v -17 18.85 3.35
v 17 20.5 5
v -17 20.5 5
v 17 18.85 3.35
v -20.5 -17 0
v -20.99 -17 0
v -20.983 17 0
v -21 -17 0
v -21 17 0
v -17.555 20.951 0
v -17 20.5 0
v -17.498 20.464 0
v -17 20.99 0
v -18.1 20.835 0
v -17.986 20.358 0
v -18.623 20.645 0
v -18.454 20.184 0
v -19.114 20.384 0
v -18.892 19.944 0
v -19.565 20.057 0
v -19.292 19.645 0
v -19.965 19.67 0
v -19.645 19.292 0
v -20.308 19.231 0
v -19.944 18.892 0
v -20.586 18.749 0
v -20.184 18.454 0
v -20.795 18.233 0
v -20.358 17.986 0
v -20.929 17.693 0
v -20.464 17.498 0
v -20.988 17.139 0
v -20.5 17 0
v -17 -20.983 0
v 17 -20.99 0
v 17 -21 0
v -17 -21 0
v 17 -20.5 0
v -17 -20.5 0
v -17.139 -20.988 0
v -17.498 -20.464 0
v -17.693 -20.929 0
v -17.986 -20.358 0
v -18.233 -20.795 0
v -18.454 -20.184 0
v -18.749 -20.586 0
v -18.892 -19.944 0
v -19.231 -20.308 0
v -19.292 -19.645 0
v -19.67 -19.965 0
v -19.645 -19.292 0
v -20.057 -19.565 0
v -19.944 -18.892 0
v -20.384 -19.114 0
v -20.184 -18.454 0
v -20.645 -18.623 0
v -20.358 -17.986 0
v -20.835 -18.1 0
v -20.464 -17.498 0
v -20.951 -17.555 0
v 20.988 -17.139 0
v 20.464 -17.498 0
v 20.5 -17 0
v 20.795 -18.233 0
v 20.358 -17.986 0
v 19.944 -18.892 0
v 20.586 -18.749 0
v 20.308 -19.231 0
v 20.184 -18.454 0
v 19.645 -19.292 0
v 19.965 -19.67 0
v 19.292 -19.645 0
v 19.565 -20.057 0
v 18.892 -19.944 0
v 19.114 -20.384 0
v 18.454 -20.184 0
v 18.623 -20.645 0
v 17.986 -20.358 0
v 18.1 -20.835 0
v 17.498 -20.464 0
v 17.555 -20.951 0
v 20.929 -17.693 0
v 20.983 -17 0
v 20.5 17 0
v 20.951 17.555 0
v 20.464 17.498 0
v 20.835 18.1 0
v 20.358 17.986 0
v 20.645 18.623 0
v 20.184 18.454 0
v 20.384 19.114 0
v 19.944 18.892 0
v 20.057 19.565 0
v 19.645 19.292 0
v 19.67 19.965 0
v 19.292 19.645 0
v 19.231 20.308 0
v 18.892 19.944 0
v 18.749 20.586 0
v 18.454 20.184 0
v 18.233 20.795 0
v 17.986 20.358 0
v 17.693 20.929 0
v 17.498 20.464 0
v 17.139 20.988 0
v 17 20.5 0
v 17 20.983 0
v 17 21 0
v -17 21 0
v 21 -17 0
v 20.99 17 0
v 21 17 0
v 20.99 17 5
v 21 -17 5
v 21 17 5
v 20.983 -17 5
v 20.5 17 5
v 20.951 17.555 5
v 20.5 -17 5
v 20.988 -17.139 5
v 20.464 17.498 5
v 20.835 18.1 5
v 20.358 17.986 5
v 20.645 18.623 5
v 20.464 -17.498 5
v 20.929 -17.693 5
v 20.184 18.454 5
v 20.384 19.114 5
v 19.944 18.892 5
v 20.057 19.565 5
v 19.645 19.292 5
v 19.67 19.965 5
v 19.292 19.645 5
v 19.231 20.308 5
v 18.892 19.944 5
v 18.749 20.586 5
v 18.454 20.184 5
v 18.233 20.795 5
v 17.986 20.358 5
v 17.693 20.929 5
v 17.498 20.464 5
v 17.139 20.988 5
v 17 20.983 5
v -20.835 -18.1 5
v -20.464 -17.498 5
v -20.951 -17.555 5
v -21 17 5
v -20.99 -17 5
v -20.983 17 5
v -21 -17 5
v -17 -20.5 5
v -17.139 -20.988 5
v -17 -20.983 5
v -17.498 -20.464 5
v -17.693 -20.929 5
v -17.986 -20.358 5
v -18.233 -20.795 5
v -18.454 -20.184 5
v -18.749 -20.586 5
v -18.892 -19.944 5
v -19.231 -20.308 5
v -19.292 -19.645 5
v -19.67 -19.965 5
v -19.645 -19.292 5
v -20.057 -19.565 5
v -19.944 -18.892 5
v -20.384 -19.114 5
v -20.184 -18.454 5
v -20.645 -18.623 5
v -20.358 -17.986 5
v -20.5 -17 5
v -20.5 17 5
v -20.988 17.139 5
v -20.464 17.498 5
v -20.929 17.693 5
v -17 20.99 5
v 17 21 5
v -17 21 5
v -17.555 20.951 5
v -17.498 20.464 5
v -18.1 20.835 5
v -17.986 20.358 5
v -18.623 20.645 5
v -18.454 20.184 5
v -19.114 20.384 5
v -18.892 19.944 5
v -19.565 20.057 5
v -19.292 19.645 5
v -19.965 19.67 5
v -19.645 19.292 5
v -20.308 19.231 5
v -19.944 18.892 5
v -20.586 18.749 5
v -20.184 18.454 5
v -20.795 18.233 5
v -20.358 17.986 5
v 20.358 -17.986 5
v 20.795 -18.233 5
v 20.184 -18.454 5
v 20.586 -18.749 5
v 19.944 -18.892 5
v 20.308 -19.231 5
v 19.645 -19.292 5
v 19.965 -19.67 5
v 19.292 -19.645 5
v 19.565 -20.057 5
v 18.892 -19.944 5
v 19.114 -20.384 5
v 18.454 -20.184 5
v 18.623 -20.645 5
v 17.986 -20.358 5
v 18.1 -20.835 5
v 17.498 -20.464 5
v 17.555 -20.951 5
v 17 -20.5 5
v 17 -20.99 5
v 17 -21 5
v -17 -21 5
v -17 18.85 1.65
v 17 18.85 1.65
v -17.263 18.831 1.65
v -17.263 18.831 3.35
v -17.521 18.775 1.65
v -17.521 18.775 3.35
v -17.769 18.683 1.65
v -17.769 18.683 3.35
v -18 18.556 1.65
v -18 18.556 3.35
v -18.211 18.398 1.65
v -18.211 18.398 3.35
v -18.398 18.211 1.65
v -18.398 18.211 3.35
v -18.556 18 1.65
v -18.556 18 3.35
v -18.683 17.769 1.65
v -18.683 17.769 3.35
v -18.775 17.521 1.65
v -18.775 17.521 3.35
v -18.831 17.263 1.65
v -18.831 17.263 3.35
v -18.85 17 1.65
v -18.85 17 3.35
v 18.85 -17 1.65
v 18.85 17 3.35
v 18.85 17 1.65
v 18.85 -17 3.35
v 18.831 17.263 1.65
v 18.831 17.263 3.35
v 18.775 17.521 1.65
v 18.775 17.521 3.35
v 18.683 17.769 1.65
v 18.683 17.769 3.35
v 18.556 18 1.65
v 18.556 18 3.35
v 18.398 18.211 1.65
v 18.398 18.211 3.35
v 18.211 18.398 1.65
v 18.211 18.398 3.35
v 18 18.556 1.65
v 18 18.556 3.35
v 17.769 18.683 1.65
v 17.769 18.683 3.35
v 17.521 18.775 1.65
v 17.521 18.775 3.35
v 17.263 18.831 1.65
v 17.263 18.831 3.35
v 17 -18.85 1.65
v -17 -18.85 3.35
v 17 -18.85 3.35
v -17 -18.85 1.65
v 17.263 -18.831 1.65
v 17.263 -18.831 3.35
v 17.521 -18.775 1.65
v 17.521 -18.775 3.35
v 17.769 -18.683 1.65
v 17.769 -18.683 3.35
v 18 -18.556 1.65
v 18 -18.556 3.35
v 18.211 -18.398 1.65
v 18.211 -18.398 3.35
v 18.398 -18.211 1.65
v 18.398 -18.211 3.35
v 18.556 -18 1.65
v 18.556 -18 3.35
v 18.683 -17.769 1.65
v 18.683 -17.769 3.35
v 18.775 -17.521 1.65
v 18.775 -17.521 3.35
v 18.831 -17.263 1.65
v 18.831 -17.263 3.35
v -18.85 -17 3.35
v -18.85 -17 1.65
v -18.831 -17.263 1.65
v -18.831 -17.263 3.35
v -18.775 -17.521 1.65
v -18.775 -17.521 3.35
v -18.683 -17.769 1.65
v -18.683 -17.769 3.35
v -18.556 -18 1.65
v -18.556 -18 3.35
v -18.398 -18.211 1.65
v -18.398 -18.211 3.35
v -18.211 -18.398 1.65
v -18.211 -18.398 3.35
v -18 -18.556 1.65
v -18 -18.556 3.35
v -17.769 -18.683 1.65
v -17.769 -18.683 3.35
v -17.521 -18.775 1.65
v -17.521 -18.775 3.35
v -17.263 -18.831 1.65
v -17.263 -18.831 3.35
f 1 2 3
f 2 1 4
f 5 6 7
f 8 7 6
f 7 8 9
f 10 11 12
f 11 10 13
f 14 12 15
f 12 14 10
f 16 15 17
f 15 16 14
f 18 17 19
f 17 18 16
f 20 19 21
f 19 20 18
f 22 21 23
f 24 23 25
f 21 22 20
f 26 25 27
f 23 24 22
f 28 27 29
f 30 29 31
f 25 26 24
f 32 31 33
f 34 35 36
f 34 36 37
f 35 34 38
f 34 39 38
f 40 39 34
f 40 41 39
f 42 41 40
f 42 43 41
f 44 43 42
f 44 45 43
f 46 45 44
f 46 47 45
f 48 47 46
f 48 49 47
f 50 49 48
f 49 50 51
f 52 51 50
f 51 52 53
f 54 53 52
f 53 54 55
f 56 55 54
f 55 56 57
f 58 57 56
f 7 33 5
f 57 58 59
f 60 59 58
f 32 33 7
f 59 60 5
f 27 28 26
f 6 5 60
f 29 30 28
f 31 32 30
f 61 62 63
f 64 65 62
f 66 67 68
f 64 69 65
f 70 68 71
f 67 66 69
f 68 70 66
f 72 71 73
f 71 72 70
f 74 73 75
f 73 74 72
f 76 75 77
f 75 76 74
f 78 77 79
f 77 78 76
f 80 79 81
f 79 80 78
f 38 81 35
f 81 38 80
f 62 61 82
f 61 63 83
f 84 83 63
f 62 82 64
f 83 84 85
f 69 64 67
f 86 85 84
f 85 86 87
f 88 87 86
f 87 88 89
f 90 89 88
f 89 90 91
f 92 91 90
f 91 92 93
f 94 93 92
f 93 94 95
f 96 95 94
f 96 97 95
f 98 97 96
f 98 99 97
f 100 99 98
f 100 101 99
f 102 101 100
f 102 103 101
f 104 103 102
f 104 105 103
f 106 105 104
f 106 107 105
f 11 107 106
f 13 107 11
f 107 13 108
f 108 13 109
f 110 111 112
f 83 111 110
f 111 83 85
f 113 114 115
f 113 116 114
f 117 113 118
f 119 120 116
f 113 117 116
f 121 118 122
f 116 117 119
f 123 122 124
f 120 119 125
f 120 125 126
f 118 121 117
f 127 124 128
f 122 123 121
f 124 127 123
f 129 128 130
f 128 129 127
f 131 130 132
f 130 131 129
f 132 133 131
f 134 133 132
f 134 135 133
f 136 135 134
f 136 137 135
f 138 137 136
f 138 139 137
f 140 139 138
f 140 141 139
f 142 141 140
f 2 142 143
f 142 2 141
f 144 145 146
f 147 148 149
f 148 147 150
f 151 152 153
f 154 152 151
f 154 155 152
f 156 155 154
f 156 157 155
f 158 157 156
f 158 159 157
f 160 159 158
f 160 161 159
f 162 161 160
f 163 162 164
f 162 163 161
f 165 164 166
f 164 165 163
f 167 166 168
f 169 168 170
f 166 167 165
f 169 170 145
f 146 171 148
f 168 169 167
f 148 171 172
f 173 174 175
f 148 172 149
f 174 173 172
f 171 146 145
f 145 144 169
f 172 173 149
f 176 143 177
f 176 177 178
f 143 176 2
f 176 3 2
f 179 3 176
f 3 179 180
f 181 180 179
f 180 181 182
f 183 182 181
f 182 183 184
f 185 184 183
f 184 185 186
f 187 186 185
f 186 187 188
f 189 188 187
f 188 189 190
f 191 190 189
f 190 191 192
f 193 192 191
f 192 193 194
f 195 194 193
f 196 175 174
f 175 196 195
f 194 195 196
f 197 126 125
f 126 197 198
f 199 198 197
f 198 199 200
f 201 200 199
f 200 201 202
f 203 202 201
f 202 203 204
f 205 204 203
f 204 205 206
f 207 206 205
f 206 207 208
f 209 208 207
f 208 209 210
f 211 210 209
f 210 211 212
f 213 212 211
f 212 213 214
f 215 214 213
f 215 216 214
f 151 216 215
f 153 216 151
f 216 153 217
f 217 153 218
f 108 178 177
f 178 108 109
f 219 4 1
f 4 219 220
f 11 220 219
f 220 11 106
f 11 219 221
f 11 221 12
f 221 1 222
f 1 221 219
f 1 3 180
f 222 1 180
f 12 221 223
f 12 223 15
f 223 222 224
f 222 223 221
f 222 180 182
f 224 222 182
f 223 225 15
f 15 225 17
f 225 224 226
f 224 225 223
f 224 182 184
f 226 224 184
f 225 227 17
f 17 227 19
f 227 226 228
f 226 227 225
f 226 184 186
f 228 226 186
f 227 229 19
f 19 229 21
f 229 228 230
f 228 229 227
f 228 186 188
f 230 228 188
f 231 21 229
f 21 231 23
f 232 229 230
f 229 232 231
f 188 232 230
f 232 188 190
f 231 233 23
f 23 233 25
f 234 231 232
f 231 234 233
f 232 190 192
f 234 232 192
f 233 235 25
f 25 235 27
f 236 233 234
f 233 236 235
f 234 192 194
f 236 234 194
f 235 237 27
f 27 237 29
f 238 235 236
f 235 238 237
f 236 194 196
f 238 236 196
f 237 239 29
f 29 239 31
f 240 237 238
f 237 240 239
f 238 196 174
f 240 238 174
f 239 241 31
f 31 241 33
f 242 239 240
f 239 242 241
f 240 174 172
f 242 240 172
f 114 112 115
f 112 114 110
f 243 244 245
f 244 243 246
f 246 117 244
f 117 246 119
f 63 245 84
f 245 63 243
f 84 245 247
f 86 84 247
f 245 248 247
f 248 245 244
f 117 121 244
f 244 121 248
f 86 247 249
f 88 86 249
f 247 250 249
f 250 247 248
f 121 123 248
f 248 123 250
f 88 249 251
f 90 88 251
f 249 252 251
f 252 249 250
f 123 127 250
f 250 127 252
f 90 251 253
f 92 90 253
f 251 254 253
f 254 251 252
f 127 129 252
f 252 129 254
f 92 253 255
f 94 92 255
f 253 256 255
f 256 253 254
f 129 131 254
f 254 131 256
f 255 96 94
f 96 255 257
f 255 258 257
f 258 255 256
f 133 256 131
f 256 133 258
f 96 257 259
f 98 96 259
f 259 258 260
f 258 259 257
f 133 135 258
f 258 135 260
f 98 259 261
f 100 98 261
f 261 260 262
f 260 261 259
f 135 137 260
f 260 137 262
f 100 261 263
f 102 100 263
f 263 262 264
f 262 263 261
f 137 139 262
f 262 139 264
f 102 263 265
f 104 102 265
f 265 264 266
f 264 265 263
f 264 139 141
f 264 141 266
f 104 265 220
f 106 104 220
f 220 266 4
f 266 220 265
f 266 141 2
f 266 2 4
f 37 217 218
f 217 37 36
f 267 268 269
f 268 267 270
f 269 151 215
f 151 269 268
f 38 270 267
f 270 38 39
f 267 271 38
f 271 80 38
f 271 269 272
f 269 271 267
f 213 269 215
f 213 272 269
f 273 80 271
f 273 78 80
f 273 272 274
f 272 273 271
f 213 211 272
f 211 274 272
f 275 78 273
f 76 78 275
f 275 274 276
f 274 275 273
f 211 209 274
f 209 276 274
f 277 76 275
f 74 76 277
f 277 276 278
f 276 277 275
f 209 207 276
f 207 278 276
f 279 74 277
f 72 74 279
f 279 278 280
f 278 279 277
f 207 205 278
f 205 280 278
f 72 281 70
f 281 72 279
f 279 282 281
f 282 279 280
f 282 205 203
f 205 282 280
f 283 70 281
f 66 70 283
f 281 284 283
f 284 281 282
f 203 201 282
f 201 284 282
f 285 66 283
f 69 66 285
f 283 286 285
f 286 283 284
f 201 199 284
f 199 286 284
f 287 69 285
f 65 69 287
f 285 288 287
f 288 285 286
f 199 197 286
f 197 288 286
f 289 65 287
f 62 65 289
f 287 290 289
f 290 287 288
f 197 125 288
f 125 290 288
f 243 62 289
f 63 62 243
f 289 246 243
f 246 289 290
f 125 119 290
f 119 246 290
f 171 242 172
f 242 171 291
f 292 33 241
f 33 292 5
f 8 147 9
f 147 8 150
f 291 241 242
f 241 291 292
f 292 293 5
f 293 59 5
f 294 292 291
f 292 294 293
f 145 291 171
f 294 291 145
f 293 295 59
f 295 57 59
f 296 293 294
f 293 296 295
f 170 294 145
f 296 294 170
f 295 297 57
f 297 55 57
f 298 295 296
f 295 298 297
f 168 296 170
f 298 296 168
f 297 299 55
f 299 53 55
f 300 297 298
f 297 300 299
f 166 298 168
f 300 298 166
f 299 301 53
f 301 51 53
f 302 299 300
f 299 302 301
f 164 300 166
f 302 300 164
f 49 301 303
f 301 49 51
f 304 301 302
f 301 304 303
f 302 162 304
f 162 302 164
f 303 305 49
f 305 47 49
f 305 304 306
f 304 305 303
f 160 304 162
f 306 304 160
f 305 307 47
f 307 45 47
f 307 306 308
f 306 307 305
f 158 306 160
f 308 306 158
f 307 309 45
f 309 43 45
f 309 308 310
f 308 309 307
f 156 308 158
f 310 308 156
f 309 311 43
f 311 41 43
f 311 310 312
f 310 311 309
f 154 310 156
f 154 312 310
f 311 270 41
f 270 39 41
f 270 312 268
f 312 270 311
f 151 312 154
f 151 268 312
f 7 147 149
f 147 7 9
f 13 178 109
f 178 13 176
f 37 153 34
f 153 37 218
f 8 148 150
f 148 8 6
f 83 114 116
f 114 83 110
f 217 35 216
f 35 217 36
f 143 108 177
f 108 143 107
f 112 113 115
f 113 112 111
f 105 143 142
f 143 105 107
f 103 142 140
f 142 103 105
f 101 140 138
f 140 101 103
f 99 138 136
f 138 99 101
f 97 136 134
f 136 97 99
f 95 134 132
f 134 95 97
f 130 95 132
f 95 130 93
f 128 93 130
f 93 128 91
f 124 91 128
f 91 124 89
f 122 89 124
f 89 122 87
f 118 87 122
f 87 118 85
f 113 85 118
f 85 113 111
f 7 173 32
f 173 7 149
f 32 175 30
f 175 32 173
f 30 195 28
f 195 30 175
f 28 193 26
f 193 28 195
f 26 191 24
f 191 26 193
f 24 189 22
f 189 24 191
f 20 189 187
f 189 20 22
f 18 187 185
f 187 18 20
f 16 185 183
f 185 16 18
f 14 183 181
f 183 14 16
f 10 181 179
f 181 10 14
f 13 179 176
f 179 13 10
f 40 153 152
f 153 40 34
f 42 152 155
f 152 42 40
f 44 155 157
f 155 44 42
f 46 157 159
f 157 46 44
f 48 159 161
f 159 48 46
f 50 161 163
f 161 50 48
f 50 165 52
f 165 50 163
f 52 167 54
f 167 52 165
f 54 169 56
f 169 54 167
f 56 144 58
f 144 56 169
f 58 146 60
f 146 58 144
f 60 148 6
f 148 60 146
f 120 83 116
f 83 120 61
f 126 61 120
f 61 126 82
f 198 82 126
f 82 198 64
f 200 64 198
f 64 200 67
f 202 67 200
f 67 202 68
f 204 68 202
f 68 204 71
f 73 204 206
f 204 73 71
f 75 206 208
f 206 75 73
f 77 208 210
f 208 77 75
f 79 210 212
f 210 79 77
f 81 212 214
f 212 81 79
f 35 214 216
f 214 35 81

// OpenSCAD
// ===== INFORMATION ===== //
/*
 IMPORTANT: rendering will be better for analyzing the model if fast-csg is enabled. As of writing, this feature is only available in the development builds and not the official release of OpenSCAD, but it makes rendering only take a couple seconds, even for comically large bins. Enable it in Edit > Preferences > Features > fast-csg

https://github.com/kennetek/gridfinity-rebuilt-openscad

*/

// ===== PARAMETERS ===== //

/* [Setup Parameters] */
$fa = 8;
$fs = 0.25;

/* [General Settings] */
// What to generate
what = 0; // [0: baseplate, 1: support spacer]

// number of units along x-axis
gridx = 1;
// number of units along y-axis
gridy = 1;

/* [Fit to Drawer] */
// minimum length of baseplate along x (leave zero to ignore, will automatically fill area if gridx is zero)
distancex = 0;
// minimum length of baseplate along y (leave zero to ignore, will automatically fill area if gridy is zero)
distancey = 0;

// where to align extra space along x
fitx = 0; // [-1:0.1:1]
// where to align extra space along y
fity = 0; // [-1:0.1:1]

module __Customizer_Limit__ () {}  // Hide following assignments from Customizer.

// Length of a grid unit
GRID_UNIT_SIZE = 42;

// Tolerance to make sure cuts don't leave a sliver behind,
// and that items are properly connected to each other.
TOLERANCE = 0.01;


BASEPLATE_OUTSIDE_RADIUS = 8 / 2;
// Overall height of the baseplate.
BASEPLATE_HEIGHT = 5;
// Width of the top and bottom surfaces that stack on each other.
// This is for single, e.g. outside wall. On inside walls it will be double that.
MATING_WIDTH = 0.5;
// Thickness of a single, e.g. outside wall. Inside walls will be double that.
BASEPLATE_WALL_THICKNESS = 2.15;
// Thickness of a spacer between stacked plates, usually one print layer.
SPACER_HEIGHT = 0.2;

SLOPE_SPAN = BASEPLATE_WALL_THICKNESS - MATING_WIDTH;
// Polygon describing the raw baseplate lip.
BASEPLATE_LIP = [
    [SLOPE_SPAN, 0], 
    [0, SLOPE_SPAN], 
    [0, BASEPLATE_HEIGHT - SLOPE_SPAN], 
    [SLOPE_SPAN, BASEPLATE_HEIGHT], 
    [BASEPLATE_WALL_THICKNESS, BASEPLATE_HEIGHT], 
    [BASEPLATE_WALL_THICKNESS, 0], 
    [SLOPE_SPAN, 0] 
];

SPACER_LIP = [
    [0, 0], 
    [MATING_WIDTH, 0], 
    [MATING_WIDTH, SPACER_HEIGHT], 
    [0, SPACER_HEIGHT], 
    [0, 0]
];

color("tomato")
if (what == 0) {
    generate(BASEPLATE_LIP, BASEPLATE_WALL_THICKNESS, BASEPLATE_HEIGHT, [gridx, gridy], [distancex, distancey], [fitx, fity]);
} else if (what == 1) {
    generate(SPACER_LIP, MATING_WIDTH, SPACER_HEIGHT, [gridx, gridy], [distancex, distancey], [fitx, fity]);
}

// ===== CONSTRUCTION ===== //

/**
 * @brief Create a baseplate.
 * @param lip_polygon polygon representing a lip section profile
 * @param wall_thickness - max thickness of the wall in mm
 * @param height height of the profile to generate
 * @param grid_size_units Number of Gridfinity units along both axes.
 *        2d Vector. [x, y].
 *        Set to [0, 0] to auto calculate using min_size_mm.
 * @param min_size_mm Minimum size of the baseplate. [x, y]
 *                    Extra space is filled with solid material.
 *                    Enables "Fit to Drawer."
 * @param fit_offset Determines where padding is added.
 */
module generate(lip_polygon, wall_thickness, height, grid_size_units, min_size_mm, fit_offset = [0, 0]) {

    assert(is_list(grid_size_units) && len(grid_size_units) == 2,
        "grid_size_bases must be a 2d list");
    assert(is_list(min_size_mm) && len(min_size_mm) == 2,
        "min_size_mm must be a 2d list");
    assert(is_list(fit_offset) && len(fit_offset) == 2,
        "fit_offset must be a 2d list");
    assert(grid_size_units.x > 0 || min_size_mm.x > 0,
        "Must have positive x grid amount!");
    assert(grid_size_units.y > 0 || min_size_mm.y > 0,
        "Must have positive y grid amount!");

    // Final size in number of units
    actual_grid_size_units = [for (i = [0:1])
        grid_size_units[i] == 0 ? floor(min_size_mm[i] / GRID_UNIT_SIZE) : grid_size_units[i]];

    // Final size of the base before padding. In mm.
    grid_size_mm = concat(actual_grid_size_units * GRID_UNIT_SIZE, [BASEPLATE_HEIGHT]);

    // Final size, including padding. In mm.
    final_size_mm = [
        max(grid_size_mm.x, min_size_mm.x),
        max(grid_size_mm.y, min_size_mm.y),
        height
    ];

    // Amount of padding needed to fit to a specific drawer size. In mm.
    padding_mm = final_size_mm - grid_size_mm;

    is_padding_needed = padding_mm != [0, 0, 0];

    //Convert the fit offset to percent of how much will be added to the positive axes.
    // -1 : 1 -> 0 : 1
    fit_percent_positive = [for (i = [0:1]) (fit_offset[i] + 1) / 2];

    padding_start_point = -grid_size_mm/2 -
        [
            padding_mm.x * (1 - fit_percent_positive.x),
            padding_mm.y * (1 - fit_percent_positive.y),
            -grid_size_mm.z/2
        ];

    corner_points = [
        padding_start_point + [final_size_mm.x, final_size_mm.y, 0],
        padding_start_point + [0, final_size_mm.y, 0],
        padding_start_point,
        padding_start_point + [final_size_mm.x, 0, 0],
    ];

    echo(str("Number of Grids per axes (X, Y)]: ", actual_grid_size_units));
    echo(str("Final size (in mm): ", final_size_mm));
    if (is_padding_needed) {
        echo(str("Padding +X (in mm): ", padding_mm.x * fit_percent_positive.x));
        echo(str("Padding -X (in mm): ", padding_mm.x * (1 - fit_percent_positive.x)));
        echo(str("Padding +Y (in mm): ", padding_mm.y * fit_percent_positive.y));
        echo(str("Padding -Y (in mm): ", padding_mm.y * (1 - fit_percent_positive.y)));
    }

    difference() {
        union() {
            // Baseplate itself
            pattern_linear(actual_grid_size_units.x, actual_grid_size_units.y, GRID_UNIT_SIZE) {
                // Single Baseplate piece
                difference() {
                    square_lip(lip_polygon, height, wall_thickness);
                }
            }

            // Padding
            if (is_padding_needed) {
                render()
                difference() {
                    translate(padding_start_point)
                    cube(final_size_mm);

                    translate([
                        -grid_size_mm.x/2,
                        -grid_size_mm.y/2,
                        0
                    ])
                    cube(grid_size_mm);
                }
            }
        }

        // Round the outside corners (Including Padding)
        for(i = [0:len(corner_points) - 1]) {
                point = corner_points[i];
                translate([
                point.x + (BASEPLATE_OUTSIDE_RADIUS * -sign(point.x)),
                point.y + (BASEPLATE_OUTSIDE_RADIUS * -sign(point.y)),
                0
            ])
            rotate([0, 0, i*90])
            square_corner(height, true);
        }
    }
}

/**
 * @brief Added or removed from the baseplate to square off or round the corners.
 * @param height Height of the plate being generated
 * @param subtract If the corner should be scaled to allow subtraction.
 */
module square_corner(height, subtract=false) {
    assert(is_bool(subtract));

    subtract_amount = subtract ? TOLERANCE : 0;

    translate([0, 0, -subtract_amount])
    linear_extrude(height + (2 * subtract_amount))
    difference() {
        square(BASEPLATE_OUTSIDE_RADIUS + subtract_amount , center=false);
        // TOLERANCE needed to prevent a gap
        circle(r=BASEPLATE_OUTSIDE_RADIUS - TOLERANCE);
    }
}

/**
 * @brief Outer edge/lip of the baseplate.
 * @details Includes clearance to ensure the base touches the lip
 *          instead of the bottom.
 * @param lip_polygon polygon representing a lip section profile
 * @param wall_thickness - max thickness of the wall in mm
 */
module lip(lip_polygon, wall_thickness) {
    // How far, in the +x direction,
    // the lip needs to be from it's [0, 0] point
    // such that when swept by 90 degrees to produce a corner,
    // the outside edge has the desired radius.
    translation_x = BASEPLATE_OUTSIDE_RADIUS - wall_thickness;

    sweep_rounded(GRID_UNIT_SIZE - 2 * BASEPLATE_OUTSIDE_RADIUS, GRID_UNIT_SIZE - 2 * BASEPLATE_OUTSIDE_RADIUS)
    translate([translation_x, 0, 0])
    polygon(concat(lip_polygon, [
        [0, 0],
        [wall_thickness, 0],
        [wall_thickness, 0]
    ]));
}

module pattern_linear(x = 1, y = 1, sx = 0, sy = 0) {
    yy = sy <= 0 ? sx : sy;
    translate([-(x-1)*sx/2,-(y-1)*yy/2,0])
    for (i = [1:ceil(x)])
    for (j = [1:ceil(y)])
    translate([(i-1)*sx,(j-1)*yy,0])
    children();
}

/**
 * @brief Outer edge/lip of the baseplate, with square corners.
 * @param lip_polygon polygon representing a lip section profile
 * @param height - height of the profile to generate
 * @param wall_thickness - max thickness of the wall in mm
 * @details Needed to prevent gaps when joining multiples together.
 */
module square_lip(lip_polygon, height, wall_thickness) {
    corner_center_distance = GRID_UNIT_SIZE/2 - BASEPLATE_OUTSIDE_RADIUS;

    render(convexity = 2) // Fixes ghosting in preview
    union() {
        lip(lip_polygon, wall_thickness);
        pattern_circular(4)
        translate([corner_center_distance, corner_center_distance, 0])
        square_corner(height);
    }
}

function affine_translate(vector) = [
    [1, 0, 0, vector.x],
    [0, 1, 0, vector.y],
    [0, 0, 1, vector.z],
    [0, 0, 0, 1]
];


/**
 * @brief Create a rectangle with rounded corners by sweeping a 2d object along a path.
 *        Centered on origin.
 */
module sweep_rounded(width, length) {
    assert(width > 0 && length > 0);

    half_width = width/2;
    half_length = length/2;
    path_points = [
        [-half_width, half_length],  //Start
        [half_width, half_length], // Over
        [half_width, -half_length], //Down
        [-half_width, -half_length], // Back over
        [-half_width, half_length]  // Up to start
    ];
    path_vectors = [
        path_points[1] - path_points[0],
        path_points[2] - path_points[1],
        path_points[3] - path_points[2],
        path_points[4] - path_points[3],
    ];
    // These contain the translations, but not the rotations
    // OpenSCAD requires this hacky for loop to get accumulate to work!
    first_translation = affine_translate([path_points[0].y, 0,path_points[0].x]);
    affine_translations = concat([first_translation], [
        for (i = 0, a = first_translation;
            i < len(path_vectors);
            a=a * affine_translate([path_vectors[i].y, 0, path_vectors[i].x]), i=i+1)
        a * affine_translate([path_vectors[i].y, 0, path_vectors[i].x])
    ]);

    // Bring extrusion to the xy plane
    affine_matrix = affine_rotate([90, 0, 90]);

    walls = [
        for (i = [0 : len(path_vectors) - 1])
        affine_matrix * affine_translations[i]
        * affine_rotate([0, atanv(path_vectors[i]), 0])
    ];

    union()
    {
        for (i = [0 : len(walls) - 1]){
            multmatrix(walls[i])
            linear_extrude(vector_magnitude(path_vectors[i]))
            children();

            // Rounded Corners
            multmatrix(walls[i] * affine_rotate([-90, 0, 0]))
            rotate_extrude(angle = 90, convexity = 4)
            children();
        }
    }
}


function _affine_rotate_x(angle_x) = [
    [1,  0, 0, 0],
    [0, cos(angle_x), -sin(angle_x), 0],
    [0, sin(angle_x), cos(angle_x), 0],
    [0, 0, 0, 1]
];

function _affine_rotate_y(angle_y) = [
    [cos(angle_y),  0, sin(angle_y), 0],
    [0, 1, 0, 0],
    [-sin(angle_y), 0, cos(angle_y), 0],
    [0, 0, 0, 1]
];

function _affine_rotate_z(angle_z) = [
    [cos(angle_z), -sin(angle_z), 0, 0],
    [sin(angle_z), cos(angle_z), 0, 0],
    [0, 0, 1, 0],
    [0, 0, 0, 1]
];


/**
 * @brief Affine transformation matrix equivalent of `rotate`
 * @param angle_vector @see `rotate`
 * @details Equivalent to `rotate([0, angle, 0])`
 * @returns An affine transformation matrix for use with `multmatrix()`
 */
function affine_rotate(angle_vector) =
    _affine_rotate_z(angle_vector.z) * _affine_rotate_y(angle_vector.y) * _affine_rotate_x(angle_vector.x);

function atanv(vector) = atan2(vector.y, vector.x);

/**
 * @brief Get the magnitude of a 2d or 3d vector
 * @param vector A 2d or 3d vectorm
 * @returns Magnitude of the vector.
 */
function vector_magnitude(vector) =
    sqrt(vector.x^2 + vector.y^2 + (len(vector) == 3 ? vector.z^2 : 0));

module pattern_circular(n=2) {
    for (i = [1:n])
    rotate(i*360/n)
    children();
}
